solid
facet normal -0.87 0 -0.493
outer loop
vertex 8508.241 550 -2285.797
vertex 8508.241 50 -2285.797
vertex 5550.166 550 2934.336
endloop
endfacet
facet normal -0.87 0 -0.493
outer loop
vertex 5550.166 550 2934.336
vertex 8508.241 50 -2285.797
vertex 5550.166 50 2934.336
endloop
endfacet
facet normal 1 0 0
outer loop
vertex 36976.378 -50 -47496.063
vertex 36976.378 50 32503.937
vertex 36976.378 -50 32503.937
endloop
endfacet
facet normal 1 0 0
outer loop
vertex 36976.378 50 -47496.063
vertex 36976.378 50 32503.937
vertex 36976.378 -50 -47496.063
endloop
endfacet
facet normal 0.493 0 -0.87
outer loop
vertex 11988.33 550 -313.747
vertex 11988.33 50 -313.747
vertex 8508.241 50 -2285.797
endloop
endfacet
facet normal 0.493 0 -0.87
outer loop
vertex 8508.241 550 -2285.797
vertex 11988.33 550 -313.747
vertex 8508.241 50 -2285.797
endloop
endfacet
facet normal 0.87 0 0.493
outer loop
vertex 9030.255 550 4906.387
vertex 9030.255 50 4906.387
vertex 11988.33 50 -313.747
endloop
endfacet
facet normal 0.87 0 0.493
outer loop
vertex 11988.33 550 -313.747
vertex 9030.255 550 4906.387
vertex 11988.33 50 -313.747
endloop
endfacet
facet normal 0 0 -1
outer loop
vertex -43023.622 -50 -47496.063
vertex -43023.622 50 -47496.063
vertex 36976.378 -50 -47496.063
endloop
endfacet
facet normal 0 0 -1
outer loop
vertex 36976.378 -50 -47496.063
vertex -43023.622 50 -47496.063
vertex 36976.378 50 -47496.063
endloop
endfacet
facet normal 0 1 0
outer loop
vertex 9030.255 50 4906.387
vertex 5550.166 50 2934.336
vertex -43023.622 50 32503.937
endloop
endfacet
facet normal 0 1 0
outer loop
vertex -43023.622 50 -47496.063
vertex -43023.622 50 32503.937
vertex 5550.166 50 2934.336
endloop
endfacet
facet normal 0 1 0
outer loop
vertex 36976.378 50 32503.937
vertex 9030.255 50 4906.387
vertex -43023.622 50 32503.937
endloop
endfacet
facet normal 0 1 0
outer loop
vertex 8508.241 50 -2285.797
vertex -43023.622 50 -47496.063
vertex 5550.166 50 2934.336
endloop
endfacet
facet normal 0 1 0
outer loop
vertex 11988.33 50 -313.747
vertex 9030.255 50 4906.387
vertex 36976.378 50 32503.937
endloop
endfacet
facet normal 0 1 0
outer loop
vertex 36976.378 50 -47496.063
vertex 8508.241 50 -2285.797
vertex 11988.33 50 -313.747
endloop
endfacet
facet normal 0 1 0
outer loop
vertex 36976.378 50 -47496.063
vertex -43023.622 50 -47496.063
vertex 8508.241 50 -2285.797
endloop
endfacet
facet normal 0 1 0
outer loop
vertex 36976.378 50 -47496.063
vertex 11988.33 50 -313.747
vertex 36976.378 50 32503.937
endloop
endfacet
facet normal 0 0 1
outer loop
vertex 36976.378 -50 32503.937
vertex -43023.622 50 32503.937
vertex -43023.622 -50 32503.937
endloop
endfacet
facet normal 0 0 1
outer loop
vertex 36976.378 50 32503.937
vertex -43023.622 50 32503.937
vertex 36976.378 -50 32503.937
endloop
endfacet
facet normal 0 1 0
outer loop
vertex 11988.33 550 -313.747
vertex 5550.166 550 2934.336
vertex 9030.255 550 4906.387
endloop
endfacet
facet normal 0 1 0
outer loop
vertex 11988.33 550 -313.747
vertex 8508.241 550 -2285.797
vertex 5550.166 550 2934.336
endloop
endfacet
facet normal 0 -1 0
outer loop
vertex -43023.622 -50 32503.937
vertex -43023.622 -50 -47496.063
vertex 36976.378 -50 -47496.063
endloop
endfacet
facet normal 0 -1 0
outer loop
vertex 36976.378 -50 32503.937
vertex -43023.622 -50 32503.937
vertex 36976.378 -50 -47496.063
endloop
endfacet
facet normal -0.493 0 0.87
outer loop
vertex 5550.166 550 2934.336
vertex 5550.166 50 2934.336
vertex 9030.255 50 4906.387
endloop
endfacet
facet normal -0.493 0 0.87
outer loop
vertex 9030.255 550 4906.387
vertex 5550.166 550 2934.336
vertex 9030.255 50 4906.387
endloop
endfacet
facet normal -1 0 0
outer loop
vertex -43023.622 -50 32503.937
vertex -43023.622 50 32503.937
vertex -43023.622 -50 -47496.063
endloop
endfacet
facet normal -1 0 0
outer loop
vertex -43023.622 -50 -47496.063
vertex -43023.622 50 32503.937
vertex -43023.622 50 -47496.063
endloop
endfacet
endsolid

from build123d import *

# Parameters (mm, degrees)
SKETCH1_W           = 80000
SKETCH1_H           = 80000
BOSS_EXTRUDE1_DEPTH = 50
BOSS_EXTRUDE2_DEPTH = 500


with BuildPart() as part:
    # Sketch1 → Boss-Extrude1 (new body, symmetric)
    with BuildSketch(Plane(origin=(0, 0, 0), x_dir=(1, 0, 0), z_dir=(0, 1, 0))):
        with Locations((-3023.622047244, 7496.062992126)):
            Rectangle(SKETCH1_W, SKETCH1_H)
    extrude(amount=BOSS_EXTRUDE1_DEPTH, both=True)

    # Sketch2 → Boss-Extrude2 (add)
    with BuildSketch(Plane(origin=(0, 50, 0), x_dir=(1, 0, 0), z_dir=(0, 1, 0))):
        Polygon((5550.165945197, -2934.336264448), (9030.254688591, -4906.386552372), (11988.330120476, 313.74656272), (8508.241377082, 2285.796850643), align=None)
    extrude(amount=BOSS_EXTRUDE2_DEPTH)


solid = part.part
